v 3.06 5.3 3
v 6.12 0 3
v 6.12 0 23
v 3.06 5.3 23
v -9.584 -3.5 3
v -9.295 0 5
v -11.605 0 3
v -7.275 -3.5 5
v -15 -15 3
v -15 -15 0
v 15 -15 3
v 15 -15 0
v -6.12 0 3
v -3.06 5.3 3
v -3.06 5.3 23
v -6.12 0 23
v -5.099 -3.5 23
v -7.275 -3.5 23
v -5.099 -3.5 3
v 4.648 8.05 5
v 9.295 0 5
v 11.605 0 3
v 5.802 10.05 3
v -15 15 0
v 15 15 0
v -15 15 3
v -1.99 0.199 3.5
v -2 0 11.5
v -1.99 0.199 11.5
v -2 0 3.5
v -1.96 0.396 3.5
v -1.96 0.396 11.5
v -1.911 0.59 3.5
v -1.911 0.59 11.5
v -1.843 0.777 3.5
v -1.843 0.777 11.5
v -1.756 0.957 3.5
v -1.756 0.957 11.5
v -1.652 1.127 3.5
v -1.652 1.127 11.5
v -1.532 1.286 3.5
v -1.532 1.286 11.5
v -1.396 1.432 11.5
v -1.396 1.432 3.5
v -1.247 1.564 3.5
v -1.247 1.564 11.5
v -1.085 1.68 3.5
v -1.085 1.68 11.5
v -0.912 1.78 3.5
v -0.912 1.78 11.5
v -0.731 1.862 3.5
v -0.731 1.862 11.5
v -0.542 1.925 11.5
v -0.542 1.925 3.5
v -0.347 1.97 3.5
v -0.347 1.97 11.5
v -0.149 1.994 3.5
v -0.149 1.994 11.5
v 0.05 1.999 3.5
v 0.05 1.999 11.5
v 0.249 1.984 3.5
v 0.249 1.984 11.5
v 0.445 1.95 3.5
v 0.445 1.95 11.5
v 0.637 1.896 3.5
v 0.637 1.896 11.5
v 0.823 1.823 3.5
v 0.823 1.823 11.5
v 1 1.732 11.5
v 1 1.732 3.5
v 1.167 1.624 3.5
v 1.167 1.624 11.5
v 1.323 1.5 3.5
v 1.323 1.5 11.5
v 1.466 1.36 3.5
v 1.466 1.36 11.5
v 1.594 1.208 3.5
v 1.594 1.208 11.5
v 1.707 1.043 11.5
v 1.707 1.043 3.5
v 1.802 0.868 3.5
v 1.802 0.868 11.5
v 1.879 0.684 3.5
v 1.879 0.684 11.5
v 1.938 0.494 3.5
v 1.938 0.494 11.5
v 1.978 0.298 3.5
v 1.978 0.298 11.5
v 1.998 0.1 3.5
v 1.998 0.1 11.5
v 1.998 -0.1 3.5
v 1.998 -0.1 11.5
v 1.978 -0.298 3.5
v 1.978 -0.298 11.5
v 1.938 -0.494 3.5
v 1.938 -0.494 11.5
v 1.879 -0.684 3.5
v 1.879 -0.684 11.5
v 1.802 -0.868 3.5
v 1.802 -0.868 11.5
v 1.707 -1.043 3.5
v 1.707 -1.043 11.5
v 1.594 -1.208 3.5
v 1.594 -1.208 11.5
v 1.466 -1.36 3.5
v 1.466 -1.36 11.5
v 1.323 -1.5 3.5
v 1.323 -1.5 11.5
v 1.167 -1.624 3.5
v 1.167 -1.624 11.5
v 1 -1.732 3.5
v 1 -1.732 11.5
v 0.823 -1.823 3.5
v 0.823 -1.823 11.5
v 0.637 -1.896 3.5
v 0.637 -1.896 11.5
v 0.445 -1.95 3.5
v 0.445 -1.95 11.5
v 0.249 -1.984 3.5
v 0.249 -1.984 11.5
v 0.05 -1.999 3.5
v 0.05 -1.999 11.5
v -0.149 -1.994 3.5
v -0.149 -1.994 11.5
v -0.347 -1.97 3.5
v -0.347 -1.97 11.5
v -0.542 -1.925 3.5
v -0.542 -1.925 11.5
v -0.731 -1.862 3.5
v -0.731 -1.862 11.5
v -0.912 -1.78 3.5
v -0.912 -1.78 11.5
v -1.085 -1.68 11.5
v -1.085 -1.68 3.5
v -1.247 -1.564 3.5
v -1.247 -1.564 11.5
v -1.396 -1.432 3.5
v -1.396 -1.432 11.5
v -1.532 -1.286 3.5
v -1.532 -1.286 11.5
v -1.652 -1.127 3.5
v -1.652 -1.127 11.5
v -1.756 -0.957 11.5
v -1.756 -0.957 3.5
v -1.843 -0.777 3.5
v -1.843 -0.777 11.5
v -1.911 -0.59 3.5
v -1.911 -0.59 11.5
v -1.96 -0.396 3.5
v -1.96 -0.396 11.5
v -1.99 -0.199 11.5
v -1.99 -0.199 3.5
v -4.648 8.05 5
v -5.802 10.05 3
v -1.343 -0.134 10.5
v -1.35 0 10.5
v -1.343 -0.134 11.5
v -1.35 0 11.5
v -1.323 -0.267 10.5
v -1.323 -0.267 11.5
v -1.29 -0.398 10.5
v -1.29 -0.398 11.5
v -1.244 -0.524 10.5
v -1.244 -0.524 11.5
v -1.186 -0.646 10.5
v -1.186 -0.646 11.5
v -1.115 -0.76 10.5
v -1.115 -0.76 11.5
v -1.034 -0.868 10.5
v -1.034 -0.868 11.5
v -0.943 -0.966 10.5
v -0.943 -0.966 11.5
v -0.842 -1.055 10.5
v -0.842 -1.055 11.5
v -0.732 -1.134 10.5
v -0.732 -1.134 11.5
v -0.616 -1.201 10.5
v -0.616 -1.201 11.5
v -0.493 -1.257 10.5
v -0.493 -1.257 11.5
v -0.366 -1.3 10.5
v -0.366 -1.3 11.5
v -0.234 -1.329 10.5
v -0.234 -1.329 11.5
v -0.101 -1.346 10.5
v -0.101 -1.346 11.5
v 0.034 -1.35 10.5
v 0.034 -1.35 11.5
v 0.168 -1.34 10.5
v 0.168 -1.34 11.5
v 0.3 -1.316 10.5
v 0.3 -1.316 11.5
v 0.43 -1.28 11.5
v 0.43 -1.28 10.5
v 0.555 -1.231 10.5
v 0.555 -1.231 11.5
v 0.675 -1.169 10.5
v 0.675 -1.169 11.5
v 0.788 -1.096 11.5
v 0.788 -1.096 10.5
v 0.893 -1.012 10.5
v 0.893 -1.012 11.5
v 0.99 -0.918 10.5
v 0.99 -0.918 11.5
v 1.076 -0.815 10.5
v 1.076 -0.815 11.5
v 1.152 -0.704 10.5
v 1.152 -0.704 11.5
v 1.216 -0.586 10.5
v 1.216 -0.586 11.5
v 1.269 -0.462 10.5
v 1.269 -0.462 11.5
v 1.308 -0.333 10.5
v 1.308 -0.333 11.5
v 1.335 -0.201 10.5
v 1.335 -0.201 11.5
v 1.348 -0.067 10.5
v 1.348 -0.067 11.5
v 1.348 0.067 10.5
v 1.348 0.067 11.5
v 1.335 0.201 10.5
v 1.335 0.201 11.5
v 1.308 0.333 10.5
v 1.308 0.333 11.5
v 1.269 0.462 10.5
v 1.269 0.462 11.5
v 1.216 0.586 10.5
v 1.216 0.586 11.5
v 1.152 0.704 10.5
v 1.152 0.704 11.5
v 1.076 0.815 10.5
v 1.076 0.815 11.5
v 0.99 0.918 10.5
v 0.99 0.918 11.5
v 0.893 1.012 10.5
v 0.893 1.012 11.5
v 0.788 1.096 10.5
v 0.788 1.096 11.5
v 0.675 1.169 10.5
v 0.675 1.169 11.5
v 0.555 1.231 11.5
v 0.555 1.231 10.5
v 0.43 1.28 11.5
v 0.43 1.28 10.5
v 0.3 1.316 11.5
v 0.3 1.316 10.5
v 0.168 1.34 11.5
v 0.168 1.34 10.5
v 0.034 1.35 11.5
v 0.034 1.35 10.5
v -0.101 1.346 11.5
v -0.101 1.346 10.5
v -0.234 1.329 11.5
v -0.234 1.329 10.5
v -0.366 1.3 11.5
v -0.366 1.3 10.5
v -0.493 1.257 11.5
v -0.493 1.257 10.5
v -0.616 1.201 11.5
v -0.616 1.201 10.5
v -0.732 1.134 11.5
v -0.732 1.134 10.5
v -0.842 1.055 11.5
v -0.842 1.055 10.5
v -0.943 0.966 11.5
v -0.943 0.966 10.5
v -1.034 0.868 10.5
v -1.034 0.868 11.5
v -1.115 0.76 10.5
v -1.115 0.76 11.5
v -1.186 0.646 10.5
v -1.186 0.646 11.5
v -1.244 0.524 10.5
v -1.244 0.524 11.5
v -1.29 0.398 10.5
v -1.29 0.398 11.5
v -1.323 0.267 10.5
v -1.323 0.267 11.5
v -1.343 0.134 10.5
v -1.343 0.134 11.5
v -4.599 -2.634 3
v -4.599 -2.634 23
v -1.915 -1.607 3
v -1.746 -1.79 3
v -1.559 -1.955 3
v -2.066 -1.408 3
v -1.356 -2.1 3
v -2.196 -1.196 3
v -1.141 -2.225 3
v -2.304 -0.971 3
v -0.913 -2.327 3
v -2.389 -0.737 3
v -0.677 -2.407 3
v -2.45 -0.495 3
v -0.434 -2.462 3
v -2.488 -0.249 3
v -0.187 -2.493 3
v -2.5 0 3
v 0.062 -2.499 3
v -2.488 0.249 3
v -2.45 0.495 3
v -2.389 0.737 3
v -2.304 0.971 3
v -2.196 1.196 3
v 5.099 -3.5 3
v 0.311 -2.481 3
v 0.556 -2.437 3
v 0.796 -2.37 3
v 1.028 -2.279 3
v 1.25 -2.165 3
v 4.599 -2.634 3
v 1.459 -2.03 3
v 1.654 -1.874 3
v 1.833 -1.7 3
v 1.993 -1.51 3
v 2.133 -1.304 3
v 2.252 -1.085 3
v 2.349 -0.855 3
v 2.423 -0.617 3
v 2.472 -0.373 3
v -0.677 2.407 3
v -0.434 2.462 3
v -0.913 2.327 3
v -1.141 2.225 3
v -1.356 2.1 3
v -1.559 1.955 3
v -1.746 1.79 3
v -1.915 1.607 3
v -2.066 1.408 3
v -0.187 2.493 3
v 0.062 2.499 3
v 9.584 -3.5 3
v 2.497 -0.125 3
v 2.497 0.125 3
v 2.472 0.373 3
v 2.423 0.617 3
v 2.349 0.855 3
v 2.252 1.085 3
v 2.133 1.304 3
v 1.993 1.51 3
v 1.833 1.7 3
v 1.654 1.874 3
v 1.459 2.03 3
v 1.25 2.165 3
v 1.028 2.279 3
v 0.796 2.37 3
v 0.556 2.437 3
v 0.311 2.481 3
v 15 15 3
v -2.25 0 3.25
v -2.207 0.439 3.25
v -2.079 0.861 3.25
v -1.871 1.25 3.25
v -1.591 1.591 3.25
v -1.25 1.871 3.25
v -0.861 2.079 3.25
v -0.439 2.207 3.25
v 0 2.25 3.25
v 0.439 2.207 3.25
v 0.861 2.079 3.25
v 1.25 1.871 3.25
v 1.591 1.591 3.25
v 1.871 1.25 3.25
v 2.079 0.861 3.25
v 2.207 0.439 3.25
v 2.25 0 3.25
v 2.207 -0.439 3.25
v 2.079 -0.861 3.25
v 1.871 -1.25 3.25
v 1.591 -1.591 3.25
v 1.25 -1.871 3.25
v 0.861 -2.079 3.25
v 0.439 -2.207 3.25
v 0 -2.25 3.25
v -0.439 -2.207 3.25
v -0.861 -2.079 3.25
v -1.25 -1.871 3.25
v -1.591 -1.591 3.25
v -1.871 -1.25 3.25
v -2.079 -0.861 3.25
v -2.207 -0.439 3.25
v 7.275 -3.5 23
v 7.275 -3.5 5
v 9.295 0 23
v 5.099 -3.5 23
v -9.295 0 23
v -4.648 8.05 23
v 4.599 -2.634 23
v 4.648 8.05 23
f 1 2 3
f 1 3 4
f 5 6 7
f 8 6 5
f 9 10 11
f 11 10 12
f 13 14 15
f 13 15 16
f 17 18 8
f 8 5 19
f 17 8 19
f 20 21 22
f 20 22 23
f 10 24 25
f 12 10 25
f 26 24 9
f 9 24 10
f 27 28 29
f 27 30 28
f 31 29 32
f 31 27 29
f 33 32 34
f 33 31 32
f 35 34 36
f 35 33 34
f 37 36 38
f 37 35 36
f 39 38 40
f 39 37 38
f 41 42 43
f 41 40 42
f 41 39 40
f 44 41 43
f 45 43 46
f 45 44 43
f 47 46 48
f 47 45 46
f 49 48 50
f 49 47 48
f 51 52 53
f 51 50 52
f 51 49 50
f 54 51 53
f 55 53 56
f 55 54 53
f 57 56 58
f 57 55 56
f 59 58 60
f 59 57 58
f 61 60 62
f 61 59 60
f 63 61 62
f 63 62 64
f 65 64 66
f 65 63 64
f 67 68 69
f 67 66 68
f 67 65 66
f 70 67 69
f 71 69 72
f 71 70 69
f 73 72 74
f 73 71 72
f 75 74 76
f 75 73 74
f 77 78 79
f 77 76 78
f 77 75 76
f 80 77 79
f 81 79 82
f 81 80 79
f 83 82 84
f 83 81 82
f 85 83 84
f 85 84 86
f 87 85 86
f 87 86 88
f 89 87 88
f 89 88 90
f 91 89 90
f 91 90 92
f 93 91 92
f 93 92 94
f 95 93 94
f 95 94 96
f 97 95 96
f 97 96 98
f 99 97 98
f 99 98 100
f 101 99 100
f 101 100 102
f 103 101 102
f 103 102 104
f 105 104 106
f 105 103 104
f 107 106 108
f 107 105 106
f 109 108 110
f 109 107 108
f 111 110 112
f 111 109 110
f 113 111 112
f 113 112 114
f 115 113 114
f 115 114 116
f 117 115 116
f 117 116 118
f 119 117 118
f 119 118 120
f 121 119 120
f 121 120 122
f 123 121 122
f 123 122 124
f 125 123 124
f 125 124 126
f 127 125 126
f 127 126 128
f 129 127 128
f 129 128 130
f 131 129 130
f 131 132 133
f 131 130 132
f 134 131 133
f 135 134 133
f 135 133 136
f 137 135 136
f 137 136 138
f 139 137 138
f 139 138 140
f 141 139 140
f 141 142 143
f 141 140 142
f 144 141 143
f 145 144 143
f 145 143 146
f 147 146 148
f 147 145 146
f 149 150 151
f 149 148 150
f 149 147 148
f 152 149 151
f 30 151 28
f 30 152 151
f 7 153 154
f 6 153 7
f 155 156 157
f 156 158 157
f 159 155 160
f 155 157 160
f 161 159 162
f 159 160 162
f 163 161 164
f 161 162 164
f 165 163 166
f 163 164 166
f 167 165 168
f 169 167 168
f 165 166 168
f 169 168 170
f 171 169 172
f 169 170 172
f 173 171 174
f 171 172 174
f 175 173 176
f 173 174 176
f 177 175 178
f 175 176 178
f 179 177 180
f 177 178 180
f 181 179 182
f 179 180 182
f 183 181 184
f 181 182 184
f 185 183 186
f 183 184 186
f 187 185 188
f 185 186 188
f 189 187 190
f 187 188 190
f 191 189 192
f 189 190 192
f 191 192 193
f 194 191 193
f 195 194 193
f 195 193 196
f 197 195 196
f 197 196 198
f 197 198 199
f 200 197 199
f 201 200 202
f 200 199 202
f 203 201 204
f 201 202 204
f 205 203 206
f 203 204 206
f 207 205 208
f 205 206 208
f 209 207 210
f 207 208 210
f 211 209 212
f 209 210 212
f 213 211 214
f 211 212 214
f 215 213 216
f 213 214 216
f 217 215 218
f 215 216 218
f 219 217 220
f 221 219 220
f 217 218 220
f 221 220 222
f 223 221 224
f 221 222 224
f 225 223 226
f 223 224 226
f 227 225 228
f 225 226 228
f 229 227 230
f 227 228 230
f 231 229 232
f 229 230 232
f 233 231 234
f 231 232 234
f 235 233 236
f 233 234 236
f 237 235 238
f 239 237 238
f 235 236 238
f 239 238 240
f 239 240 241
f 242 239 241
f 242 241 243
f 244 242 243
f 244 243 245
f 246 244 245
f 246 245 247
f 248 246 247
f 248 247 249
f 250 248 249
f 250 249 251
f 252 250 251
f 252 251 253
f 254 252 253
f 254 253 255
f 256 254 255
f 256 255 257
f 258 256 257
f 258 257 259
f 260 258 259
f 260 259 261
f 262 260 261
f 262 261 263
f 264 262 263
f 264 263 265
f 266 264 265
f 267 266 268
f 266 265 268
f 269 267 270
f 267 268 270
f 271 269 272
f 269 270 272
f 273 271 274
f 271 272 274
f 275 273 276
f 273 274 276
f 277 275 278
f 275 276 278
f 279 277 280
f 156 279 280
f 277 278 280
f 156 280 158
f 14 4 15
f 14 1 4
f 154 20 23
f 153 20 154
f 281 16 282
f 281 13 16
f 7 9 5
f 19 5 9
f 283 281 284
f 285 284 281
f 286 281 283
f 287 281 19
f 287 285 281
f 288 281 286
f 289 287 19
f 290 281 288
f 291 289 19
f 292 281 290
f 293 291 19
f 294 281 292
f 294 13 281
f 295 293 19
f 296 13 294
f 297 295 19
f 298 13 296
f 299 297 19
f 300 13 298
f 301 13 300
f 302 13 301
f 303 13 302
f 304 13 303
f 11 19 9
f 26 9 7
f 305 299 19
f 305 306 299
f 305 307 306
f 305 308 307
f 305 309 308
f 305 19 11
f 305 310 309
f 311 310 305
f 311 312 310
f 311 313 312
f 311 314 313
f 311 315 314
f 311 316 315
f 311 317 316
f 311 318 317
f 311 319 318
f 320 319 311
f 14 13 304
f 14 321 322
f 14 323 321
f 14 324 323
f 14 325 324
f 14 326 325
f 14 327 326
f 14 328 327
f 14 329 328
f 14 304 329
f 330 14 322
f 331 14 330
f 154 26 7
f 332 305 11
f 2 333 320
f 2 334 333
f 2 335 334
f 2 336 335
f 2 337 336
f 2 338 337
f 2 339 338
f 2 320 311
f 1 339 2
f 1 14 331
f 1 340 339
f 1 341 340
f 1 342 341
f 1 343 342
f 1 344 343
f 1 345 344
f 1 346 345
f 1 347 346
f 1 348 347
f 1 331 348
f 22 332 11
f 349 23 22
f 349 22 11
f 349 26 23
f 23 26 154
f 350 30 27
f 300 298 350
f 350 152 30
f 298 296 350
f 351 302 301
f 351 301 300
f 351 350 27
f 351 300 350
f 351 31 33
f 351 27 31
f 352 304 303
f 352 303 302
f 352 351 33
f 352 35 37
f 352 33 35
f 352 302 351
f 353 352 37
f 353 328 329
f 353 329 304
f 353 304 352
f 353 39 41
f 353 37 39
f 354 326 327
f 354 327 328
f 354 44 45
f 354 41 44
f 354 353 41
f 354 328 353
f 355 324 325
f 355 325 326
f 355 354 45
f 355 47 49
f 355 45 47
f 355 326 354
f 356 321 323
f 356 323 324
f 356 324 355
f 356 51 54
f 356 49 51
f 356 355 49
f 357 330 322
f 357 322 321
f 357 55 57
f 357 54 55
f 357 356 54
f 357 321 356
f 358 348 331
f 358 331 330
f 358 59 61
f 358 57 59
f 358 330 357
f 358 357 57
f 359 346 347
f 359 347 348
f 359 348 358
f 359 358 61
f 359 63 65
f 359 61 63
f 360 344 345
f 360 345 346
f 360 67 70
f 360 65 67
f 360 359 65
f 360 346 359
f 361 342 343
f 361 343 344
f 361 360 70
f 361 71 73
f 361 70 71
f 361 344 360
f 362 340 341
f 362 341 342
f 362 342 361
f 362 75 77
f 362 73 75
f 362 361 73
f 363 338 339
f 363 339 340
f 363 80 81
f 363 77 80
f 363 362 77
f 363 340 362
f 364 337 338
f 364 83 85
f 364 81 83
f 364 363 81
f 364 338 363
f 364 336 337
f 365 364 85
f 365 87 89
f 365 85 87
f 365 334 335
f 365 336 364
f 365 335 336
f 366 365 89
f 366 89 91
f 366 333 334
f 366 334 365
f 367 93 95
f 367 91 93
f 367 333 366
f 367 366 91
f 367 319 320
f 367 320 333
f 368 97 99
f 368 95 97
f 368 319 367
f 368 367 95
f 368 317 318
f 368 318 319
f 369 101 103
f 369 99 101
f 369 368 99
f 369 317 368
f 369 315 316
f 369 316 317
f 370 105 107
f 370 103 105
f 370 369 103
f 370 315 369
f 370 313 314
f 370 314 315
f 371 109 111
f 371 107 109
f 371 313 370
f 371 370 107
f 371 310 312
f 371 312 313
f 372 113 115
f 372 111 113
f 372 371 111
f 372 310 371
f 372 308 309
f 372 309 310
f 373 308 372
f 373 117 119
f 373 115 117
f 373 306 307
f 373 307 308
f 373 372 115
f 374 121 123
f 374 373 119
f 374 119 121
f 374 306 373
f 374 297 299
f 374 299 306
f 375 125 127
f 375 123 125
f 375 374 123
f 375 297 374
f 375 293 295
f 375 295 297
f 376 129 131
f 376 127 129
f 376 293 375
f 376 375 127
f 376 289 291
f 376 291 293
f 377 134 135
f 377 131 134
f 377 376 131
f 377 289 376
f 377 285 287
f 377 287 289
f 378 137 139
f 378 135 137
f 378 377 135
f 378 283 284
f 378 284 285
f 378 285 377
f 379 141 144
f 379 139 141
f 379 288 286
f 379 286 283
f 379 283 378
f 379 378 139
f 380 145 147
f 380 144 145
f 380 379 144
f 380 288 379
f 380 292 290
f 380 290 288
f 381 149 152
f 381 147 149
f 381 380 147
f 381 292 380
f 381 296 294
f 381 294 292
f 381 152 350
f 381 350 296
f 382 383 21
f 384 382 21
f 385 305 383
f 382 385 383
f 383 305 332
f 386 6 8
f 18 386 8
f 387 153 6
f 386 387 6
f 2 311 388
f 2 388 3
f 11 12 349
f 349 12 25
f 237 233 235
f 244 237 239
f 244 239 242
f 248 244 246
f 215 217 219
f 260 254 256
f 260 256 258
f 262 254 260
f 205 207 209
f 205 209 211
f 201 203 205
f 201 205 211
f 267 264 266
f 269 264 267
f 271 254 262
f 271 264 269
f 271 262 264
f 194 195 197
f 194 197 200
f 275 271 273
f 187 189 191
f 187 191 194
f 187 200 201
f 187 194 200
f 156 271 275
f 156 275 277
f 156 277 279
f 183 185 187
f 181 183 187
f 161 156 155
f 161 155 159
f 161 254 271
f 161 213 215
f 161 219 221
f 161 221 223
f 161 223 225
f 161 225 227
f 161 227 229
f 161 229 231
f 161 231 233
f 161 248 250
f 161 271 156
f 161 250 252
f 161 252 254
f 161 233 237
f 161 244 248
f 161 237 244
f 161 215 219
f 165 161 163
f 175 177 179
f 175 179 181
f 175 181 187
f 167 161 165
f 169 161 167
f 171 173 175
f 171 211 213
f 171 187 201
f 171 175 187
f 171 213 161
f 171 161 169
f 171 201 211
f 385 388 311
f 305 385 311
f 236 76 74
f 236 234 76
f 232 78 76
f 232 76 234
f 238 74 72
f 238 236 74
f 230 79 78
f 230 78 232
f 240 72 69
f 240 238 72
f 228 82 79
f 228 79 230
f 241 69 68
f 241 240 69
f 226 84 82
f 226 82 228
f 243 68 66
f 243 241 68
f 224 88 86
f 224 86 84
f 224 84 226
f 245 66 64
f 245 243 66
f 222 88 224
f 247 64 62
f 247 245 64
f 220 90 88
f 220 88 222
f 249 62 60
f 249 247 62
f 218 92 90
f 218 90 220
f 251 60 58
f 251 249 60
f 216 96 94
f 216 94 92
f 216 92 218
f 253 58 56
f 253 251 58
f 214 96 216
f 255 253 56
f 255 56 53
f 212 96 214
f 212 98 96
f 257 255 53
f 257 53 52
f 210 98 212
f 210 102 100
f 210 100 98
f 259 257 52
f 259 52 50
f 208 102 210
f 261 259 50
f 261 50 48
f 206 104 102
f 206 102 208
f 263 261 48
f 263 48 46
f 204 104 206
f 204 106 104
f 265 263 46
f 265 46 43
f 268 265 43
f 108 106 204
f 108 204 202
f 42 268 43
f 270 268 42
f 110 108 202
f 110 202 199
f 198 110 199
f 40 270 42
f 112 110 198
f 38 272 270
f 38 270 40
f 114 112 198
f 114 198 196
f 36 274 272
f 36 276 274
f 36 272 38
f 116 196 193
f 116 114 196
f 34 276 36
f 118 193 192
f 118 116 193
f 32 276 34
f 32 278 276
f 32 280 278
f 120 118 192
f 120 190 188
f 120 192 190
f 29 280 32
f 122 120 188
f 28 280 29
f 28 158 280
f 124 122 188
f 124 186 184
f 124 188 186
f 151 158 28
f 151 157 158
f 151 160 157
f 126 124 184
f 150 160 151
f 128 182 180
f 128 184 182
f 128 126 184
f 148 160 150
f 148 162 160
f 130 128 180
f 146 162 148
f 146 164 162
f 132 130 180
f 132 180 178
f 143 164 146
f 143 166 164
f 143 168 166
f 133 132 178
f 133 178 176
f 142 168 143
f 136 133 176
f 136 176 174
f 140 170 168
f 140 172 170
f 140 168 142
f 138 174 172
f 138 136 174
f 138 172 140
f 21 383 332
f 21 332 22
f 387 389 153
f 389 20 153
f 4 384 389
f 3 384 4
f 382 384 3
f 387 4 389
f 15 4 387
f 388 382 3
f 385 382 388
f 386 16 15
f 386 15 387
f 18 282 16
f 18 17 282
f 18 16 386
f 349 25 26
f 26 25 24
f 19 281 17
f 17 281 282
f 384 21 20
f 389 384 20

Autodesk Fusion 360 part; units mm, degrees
sketch "Sketch1" plane through (0, 0, 0) normal (0, 0, 1) x (1, 0, 0)
  line L0 (15, 15) -> (-15, 15)
  line L1 (-15, 15) -> (-15, -15)
  line L2 (-15, -15) -> (15, -15)
  line L3 (15, -15) -> (15, 15)
  line L4 (15, 15) -> (-15, -15) construction
  line L5 (-15, 15) -> (15, -15) construction
  dimension "d1" = 30
  dimension "d2" = 30
extrude "Extrude1" add sketch "Sketch1" along normal blind 3
sketch "Sketch2" plane through (0, 0, 3) normal (0, 0, 1) x (-1, 0, 0)
  line L0 (-15, 15) -> (-15, -15)
  line L1 (-15, -15) -> (15, -15)
  line L2 (15, -15) -> (15, 15)
  line L3 (15, 15) -> (-15, 15)
  circle A0 centre (0, 0) radius 2
  dimension "d5" = 4
extrude "Extrude2" add sketch "Sketch2" along normal blind 8.5 contours A0
sketch "Sketch3" plane through (0, 0, 11.5) normal (0, 0, 1) x (-1, 0, 0)
  circle A0 centre (0, 0) radius 2
  circle A1 centre (0, 0) radius 1.35
  dimension "d8" = 2.7
extrude "Extrude3" cut sketch "Sketch3" against normal blind 1 contours A1
sketch "Sketch4" plane through (0, 0, 3) normal (0, 0, 1) x (-1, 0, 0)
  circle A0 centre (0, 0) radius 2
  line L0 (-15, 15) -> (-15, -15)
  line L1 (-15, -15) -> (15, -15)
  line L2 (15, -15) -> (15, 15)
  line L3 (15, 15) -> (-15, 15)
  line L4 (3.06, -5.3) -> (6.1199, 0)
  line L5 (6.1199, 0) -> (3.06, 5.3)
  line L6 (3.06, 5.3) -> (-3.06, 5.3)
  line L7 (-3.06, 5.3) -> (-6.1199, 0)
  line L8 (-6.1199, 0) -> (-3.06, -5.3)
  line L9 (-3.06, -5.3) -> (3.06, -5.3)
  line L10 (9.2953, 0) -> (4.6477, 8.05)
  line L11 (4.6477, 8.05) -> (-4.6477, 8.05)
  line L12 (-4.6477, 8.05) -> (-9.2953, 0)
  line L13 (-9.2953, 0) -> (-4.6477, -8.05)
  line L14 (-4.6477, -8.05) -> (4.6477, -8.05)
  line L15 (4.6477, -8.05) -> (9.2953, 0)
  line L16 (15, 3.5) -> (-15, 3.5)
  dimension "d11" = 10.5
  dimension "d12" = 2.75
  dimension "d13" = 3.5
extrude "Extrude4" add sketch "Sketch4" along normal blind 20 contours L4 L5 L7 L8 L9 L10 L12 L13 L14 L15 L16
chamfer "Chamfer1" distance 1 angle 45 2 edges at (4.0992, -3.5, 13) (-4.0992, -3.5, 13)
chamfer "Chamfer2" distance 2 angle 45 3 edges at (6.9715, 4.025, 3) (0, 8.05, 3) (-6.9715, 4.025, 3)
chamfer "Chamfer2" distance 2 angle 45 2 edges at (8.285, -1.75, 3) (-8.285, -1.75, 3)
chamfer "Chamfer2" distance 0.5 angle 45 1 edges at (1.8647, -0.7232, 3)
